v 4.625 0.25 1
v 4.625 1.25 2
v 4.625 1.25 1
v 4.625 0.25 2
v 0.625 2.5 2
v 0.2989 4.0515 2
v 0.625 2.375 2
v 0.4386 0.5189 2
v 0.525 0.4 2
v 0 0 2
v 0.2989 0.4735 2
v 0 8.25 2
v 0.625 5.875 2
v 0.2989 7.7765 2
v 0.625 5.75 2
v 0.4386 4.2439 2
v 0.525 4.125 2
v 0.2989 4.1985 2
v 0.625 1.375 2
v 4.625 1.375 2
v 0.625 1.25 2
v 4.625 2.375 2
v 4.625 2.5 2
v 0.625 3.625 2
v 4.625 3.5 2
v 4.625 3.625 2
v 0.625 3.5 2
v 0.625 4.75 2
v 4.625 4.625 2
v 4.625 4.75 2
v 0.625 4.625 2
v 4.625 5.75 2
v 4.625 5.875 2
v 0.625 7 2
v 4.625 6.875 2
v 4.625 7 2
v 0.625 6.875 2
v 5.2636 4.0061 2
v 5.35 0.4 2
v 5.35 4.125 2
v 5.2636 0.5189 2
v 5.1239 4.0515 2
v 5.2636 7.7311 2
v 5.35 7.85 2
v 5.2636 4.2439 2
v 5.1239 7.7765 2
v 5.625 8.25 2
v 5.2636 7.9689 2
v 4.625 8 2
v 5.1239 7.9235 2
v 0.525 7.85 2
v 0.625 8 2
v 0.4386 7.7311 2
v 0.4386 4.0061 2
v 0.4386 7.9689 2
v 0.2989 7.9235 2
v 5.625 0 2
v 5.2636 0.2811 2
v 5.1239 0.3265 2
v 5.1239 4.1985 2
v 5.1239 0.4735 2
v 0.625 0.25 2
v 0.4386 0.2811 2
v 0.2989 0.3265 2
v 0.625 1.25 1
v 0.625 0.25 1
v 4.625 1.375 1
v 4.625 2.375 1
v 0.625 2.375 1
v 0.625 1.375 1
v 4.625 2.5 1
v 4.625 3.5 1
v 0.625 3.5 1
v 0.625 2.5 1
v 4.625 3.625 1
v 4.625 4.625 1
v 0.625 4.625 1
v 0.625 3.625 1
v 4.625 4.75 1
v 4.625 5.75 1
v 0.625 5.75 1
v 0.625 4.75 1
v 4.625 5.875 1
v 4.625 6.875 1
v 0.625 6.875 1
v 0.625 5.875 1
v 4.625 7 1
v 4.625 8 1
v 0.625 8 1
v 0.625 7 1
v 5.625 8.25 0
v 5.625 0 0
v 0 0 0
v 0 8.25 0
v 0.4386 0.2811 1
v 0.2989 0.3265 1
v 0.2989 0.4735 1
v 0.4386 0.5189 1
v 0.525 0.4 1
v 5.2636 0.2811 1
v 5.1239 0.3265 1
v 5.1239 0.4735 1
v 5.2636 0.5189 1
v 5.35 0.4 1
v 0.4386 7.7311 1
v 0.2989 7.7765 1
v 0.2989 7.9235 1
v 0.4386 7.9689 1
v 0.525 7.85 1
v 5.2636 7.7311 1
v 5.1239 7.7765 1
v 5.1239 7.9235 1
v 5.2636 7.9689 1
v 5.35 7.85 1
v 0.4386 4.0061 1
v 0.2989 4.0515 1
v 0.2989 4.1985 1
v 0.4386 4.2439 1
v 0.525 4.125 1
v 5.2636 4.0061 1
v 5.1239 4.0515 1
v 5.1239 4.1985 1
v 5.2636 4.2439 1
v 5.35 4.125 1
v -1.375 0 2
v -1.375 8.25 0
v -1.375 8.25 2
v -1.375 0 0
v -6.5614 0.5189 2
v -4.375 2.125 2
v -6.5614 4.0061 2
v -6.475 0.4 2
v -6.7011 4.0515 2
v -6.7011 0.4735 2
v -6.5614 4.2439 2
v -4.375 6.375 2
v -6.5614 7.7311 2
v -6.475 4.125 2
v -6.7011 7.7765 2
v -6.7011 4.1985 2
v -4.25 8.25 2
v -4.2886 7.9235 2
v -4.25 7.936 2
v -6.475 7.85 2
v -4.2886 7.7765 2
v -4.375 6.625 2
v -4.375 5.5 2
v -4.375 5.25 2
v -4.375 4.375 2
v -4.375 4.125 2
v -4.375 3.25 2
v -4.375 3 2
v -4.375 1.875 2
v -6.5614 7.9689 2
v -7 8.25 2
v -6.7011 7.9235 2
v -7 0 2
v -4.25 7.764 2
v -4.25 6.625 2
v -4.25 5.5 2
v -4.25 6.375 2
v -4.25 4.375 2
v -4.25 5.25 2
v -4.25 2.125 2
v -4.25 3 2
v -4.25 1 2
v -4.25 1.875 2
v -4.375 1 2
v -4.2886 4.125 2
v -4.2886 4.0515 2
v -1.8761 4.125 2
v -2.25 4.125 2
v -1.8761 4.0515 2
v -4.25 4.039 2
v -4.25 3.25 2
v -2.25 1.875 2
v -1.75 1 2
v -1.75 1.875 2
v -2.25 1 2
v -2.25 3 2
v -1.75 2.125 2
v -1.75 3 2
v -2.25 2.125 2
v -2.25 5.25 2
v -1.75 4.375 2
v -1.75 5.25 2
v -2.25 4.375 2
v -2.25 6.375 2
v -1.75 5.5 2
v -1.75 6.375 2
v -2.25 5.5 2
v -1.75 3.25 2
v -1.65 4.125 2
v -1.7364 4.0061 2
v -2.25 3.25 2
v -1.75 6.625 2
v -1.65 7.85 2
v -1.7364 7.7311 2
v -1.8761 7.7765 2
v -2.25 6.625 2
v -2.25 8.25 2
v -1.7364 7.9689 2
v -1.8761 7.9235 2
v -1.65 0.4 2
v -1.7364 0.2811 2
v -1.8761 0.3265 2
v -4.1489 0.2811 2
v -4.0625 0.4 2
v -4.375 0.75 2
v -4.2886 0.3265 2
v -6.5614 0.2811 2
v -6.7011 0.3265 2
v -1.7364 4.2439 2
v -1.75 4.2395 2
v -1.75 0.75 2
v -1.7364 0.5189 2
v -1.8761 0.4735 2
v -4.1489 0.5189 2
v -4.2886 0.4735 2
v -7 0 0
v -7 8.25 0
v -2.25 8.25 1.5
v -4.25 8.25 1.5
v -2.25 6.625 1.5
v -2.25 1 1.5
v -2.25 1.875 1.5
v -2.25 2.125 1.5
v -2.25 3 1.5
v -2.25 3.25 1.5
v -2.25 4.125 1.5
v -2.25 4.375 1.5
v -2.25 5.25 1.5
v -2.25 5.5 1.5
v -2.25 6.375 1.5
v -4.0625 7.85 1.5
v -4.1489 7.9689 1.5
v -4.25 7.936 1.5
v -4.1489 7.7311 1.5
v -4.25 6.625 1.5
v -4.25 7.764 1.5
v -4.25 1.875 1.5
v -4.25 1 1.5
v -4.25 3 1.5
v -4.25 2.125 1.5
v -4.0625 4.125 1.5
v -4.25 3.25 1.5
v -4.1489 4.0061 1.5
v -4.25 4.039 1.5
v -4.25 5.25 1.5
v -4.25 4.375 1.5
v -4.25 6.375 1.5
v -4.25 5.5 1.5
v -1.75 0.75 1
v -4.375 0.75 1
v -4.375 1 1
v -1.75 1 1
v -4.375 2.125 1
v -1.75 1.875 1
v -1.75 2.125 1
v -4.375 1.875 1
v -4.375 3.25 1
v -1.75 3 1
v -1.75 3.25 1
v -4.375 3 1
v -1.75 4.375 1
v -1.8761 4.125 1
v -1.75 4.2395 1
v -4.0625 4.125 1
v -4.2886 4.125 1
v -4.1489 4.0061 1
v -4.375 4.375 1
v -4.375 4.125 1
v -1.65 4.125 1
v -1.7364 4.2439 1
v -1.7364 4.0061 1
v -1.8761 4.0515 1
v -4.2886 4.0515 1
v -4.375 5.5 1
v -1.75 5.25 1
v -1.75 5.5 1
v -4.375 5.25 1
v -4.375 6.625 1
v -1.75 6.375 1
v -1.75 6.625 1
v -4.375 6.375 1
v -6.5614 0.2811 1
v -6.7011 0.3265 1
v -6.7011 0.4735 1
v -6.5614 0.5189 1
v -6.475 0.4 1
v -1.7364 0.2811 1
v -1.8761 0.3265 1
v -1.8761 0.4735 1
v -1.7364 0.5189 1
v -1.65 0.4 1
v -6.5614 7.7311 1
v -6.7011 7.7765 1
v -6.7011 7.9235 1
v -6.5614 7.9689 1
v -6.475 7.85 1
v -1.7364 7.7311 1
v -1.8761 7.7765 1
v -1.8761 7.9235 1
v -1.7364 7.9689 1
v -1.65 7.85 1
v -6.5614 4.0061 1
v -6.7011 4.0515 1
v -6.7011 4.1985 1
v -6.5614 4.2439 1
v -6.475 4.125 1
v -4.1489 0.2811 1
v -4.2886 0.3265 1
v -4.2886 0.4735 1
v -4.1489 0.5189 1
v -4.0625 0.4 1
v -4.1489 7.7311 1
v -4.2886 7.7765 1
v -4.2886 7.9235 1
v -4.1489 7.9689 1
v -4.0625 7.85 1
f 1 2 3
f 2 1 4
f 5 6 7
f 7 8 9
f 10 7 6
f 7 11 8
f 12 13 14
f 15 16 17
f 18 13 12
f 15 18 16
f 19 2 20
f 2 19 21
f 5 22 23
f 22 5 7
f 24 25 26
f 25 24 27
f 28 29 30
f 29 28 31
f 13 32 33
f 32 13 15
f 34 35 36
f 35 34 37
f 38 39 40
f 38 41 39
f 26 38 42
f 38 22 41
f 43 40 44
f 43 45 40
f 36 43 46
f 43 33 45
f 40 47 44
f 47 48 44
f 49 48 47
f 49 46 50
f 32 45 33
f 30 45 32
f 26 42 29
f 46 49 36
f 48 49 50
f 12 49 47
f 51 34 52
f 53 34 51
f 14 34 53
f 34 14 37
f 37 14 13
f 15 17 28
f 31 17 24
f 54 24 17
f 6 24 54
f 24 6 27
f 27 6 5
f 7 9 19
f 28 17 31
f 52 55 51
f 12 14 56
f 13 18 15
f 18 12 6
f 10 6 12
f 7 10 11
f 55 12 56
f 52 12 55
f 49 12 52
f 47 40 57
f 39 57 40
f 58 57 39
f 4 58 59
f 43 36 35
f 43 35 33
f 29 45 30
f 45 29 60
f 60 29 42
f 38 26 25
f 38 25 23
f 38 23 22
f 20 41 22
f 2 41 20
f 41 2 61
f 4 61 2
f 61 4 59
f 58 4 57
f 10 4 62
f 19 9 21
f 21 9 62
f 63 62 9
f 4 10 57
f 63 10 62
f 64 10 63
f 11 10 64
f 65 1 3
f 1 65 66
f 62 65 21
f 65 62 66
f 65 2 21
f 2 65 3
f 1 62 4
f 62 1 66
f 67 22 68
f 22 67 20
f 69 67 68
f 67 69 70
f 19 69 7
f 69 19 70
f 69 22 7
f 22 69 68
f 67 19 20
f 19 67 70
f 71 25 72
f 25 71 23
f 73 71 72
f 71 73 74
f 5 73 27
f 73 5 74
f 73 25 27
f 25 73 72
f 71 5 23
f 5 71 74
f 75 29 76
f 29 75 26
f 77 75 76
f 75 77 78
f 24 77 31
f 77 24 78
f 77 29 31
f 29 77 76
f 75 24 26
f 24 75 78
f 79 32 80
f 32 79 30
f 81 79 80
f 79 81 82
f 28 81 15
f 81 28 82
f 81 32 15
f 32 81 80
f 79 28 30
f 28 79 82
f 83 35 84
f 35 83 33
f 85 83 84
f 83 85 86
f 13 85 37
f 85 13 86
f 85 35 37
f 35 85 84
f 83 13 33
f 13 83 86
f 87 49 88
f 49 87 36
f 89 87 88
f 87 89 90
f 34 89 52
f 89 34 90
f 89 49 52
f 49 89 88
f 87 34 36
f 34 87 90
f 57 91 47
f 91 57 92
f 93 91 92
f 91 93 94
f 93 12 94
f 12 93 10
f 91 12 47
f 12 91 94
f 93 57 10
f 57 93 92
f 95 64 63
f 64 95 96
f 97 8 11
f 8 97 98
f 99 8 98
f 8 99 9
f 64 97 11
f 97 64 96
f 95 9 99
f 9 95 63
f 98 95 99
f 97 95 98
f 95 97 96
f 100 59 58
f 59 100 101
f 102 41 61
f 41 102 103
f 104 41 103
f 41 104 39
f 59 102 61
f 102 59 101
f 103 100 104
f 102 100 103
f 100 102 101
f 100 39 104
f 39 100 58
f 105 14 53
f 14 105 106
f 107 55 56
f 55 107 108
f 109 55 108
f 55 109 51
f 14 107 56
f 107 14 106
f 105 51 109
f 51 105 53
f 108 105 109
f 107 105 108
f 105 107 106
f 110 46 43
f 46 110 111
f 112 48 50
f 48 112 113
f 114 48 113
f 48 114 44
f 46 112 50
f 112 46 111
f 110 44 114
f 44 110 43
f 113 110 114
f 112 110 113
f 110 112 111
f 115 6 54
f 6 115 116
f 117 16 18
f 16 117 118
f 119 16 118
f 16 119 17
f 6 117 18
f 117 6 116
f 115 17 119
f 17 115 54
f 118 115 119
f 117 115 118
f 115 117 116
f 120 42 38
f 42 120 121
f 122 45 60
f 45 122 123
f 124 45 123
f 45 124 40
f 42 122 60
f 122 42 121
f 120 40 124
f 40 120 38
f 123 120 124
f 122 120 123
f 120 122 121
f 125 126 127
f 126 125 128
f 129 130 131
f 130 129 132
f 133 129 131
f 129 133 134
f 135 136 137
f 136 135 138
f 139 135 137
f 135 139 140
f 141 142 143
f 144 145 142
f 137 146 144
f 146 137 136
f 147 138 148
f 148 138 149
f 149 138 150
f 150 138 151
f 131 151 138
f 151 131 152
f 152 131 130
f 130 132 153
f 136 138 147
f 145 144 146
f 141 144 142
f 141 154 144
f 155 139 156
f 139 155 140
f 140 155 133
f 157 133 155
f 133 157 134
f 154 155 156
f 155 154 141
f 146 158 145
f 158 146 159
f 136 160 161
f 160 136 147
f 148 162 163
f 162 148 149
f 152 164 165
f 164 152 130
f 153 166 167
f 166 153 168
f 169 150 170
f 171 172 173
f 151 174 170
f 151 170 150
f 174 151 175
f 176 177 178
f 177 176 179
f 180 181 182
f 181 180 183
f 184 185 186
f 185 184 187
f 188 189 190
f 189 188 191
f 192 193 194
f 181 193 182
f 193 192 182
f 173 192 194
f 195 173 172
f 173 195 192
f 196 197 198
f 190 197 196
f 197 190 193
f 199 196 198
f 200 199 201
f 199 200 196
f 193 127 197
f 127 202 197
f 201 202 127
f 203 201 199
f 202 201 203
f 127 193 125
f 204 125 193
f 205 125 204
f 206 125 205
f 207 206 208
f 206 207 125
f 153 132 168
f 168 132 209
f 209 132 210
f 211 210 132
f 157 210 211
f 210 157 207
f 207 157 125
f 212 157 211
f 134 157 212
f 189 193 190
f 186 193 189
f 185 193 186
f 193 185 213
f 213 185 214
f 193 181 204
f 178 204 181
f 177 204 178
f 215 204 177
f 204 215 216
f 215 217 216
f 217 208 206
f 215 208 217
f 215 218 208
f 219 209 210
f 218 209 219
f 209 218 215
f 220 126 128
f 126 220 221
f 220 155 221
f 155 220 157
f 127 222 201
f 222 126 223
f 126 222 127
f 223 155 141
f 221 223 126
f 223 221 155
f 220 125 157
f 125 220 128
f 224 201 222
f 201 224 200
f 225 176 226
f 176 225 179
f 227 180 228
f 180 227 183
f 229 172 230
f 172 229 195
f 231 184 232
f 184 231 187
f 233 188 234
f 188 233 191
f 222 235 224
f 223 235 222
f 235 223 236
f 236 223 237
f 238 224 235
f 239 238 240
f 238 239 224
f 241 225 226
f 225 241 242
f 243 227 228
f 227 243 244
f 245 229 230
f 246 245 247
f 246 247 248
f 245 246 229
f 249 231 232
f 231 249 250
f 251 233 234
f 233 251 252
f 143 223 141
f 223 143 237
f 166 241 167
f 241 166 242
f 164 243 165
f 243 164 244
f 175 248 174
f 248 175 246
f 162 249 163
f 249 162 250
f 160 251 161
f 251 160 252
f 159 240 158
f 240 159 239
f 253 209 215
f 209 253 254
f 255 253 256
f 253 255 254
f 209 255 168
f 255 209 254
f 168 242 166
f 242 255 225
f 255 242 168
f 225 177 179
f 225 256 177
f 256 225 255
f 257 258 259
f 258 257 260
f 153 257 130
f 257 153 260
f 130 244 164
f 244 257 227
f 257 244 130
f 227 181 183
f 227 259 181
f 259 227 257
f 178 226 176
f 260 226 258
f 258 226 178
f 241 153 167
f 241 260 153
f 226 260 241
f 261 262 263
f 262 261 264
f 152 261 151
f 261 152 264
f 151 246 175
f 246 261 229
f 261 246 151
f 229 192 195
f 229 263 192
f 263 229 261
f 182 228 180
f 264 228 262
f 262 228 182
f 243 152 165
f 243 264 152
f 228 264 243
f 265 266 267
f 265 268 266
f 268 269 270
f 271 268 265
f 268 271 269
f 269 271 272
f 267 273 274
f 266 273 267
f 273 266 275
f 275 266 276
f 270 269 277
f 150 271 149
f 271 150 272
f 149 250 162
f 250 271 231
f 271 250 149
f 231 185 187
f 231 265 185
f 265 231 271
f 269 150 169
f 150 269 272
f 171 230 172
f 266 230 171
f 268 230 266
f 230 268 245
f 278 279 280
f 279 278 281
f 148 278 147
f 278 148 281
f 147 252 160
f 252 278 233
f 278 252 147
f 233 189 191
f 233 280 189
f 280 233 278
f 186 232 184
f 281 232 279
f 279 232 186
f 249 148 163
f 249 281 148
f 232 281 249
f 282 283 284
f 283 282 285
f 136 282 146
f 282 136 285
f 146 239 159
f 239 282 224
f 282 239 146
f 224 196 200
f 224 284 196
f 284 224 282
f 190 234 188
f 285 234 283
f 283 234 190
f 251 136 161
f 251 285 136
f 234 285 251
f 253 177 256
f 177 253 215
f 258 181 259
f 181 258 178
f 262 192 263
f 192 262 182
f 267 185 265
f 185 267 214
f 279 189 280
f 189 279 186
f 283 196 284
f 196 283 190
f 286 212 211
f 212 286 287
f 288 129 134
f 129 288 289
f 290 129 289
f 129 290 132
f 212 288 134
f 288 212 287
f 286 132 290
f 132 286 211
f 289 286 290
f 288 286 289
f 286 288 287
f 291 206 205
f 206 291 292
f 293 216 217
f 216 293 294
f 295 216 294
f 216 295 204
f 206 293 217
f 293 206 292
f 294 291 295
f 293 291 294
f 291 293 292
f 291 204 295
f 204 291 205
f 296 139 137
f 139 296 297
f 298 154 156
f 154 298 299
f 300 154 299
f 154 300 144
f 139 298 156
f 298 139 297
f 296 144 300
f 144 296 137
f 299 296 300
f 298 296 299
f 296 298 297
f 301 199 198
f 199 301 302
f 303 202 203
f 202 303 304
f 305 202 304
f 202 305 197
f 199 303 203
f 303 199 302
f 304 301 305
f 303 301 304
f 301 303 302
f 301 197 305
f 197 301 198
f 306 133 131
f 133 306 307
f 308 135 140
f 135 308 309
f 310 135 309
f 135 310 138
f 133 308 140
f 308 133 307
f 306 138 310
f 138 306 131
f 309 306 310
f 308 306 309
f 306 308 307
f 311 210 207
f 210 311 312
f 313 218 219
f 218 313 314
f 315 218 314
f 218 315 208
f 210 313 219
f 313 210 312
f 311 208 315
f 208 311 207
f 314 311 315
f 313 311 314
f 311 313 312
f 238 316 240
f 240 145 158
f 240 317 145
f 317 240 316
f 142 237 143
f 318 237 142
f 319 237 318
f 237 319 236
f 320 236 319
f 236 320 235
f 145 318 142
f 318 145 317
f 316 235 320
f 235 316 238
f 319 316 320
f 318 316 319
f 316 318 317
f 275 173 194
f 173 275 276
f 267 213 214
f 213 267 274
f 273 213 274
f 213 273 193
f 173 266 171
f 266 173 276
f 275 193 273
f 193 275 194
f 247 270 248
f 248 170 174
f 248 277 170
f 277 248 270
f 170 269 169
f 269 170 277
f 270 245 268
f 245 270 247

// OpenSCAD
Top();
translate([-7,0,0]) Bottom();

Width=5+5/8;
Length=8.25;
Height=2;

//Number of Drives
DriveNumX=7;
DriveNumY=1;

//drive offset
DriveOffsetX1=5/8;
DriveOffsetX2=1.25;
DriveOffsetY=0;
DriveOffsetZ=1;

//drive spacing
DriveSpace=0.125;
DriveInset=1;
DriveBaseOffset=0.25;

//drive demintions
DriveLength=5.75;
DriveWidth=4;
DriveHeight=1;

//supports
SupportOffset=0.4;
SupportRadius=.125;

//bottom cutouts
cablegrooveX=0;
connectorCutX=2;
connectorCutY=0.25;
connectorCutZ=1;
connectorOffX1=DriveOffsetX1+DriveWidth-connectorCutX;
connectorOffX2=DriveOffsetX2+DriveWidth-connectorCutX;

module Top()
{
difference()
	{
	cube([Width,Length,Height]);

for (J = [0 : DriveNumY-1])
{
	for (Z = [0 : DriveNumX-1])
	{
		translate([DriveOffsetX1+DriveOffsetX2*J,DriveBaseOffset+DriveSpace*Z+DriveHeight*Z,DriveOffsetZ]) cube([DriveWidth,DriveHeight,DriveInset]);
	}
}

	translate([SupportOffset,SupportOffset,1]) cylinder (h=1,r=SupportRadius);
	translate([Width-SupportOffset,SupportOffset,1]) cylinder (h=1,r=SupportRadius);
	translate([SupportOffset,Length-SupportOffset,1]) cylinder (h=1,r=SupportRadius);
	translate([Width-SupportOffset,Length-SupportOffset,1]) cylinder (h=1,r=SupportRadius);

	translate([SupportOffset,Length/2,1]) cylinder (h=1,r=SupportRadius);
	translate([Width/2,SupportOffset,1]) cylinder (h=1,r=SupportRadius);
	translate([Width/2,Length-SupportOffset,1]) cylinder (h=1,r=SupportRadius);
	translate([Width-SupportOffset,Length/2,1]) cylinder (h=1,r=SupportRadius);

	translate([Width/2,Length/2,1]) cylinder (h=1,r=SupportRadius);
	}
}

module Bottom()
{
difference()
	{
	cube([Width,Length,Height]);
	translate([2.75,.75,1.5]) cube([connectorCutX,11.25,0.5]);
	translate([7.25,.75,1.5]) cube([connectorCutX,11.25,0.5]);

	translate([connectorOffX1,0.75+DriveSpace*0+DriveHeight*0,DriveOffsetZ]) cube([connectorCutX,connectorCutY,connectorCutZ]);
	translate([connectorOffX1,0.75+DriveSpace*1+DriveHeight*1,DriveOffsetZ]) cube([connectorCutX,connectorCutY,connectorCutZ]);
	translate([connectorOffX1,0.75+DriveSpace*2+DriveHeight*2,DriveOffsetZ]) cube([connectorCutX,connectorCutY,connectorCutZ]);
	translate([connectorOffX1,0.75+DriveSpace*3+DriveHeight*3,DriveOffsetZ]) cube([connectorCutX,connectorCutY,connectorCutZ]);
	translate([connectorOffX1,0.75+DriveSpace*4+DriveHeight*4,DriveOffsetZ]) cube([connectorCutX,connectorCutY,connectorCutZ]);
	translate([connectorOffX1,0.75+DriveSpace*5+DriveHeight*5,DriveOffsetZ]) cube([connectorCutX,connectorCutY,connectorCutZ]);

	translate([connectorOffX2,0.75+DriveSpace*0+DriveHeight*0,DriveOffsetZ]) cube([connectorCutX,connectorCutY,connectorCutZ]);
	translate([connectorOffX2,0.75+DriveSpace*1+DriveHeight*1,DriveOffsetZ]) cube([connectorCutX,connectorCutY,connectorCutZ]);
	translate([connectorOffX2,0.75+DriveSpace*2+DriveHeight*2,DriveOffsetZ]) cube([connectorCutX,connectorCutY,connectorCutZ]);
	translate([connectorOffX2,0.75+DriveSpace*3+DriveHeight*3,DriveOffsetZ]) cube([connectorCutX,connectorCutY,connectorCutZ]);
	translate([connectorOffX2,0.75+DriveSpace*4+DriveHeight*4,DriveOffsetZ]) cube([connectorCutX,connectorCutY,connectorCutZ]);
	translate([connectorOffX2,0.75+DriveSpace*5+DriveHeight*5,DriveOffsetZ]) cube([connectorCutX,connectorCutY,connectorCutZ]);

	translate([SupportOffset,SupportOffset,1]) cylinder (h=1,r=SupportRadius);
	translate([Width-SupportOffset,SupportOffset,1]) cylinder (h=1,r=SupportRadius);
	translate([SupportOffset,Length-SupportOffset,1]) cylinder (h=1,r=SupportRadius);
	translate([Width-SupportOffset,Length-SupportOffset,1]) cylinder (h=1,r=SupportRadius);

	translate([SupportOffset,Length/2,1]) cylinder (h=1,r=SupportRadius);
	translate([Width/2,SupportOffset,1]) cylinder (h=1,r=SupportRadius);
	translate([Width/2,Length-SupportOffset,1]) cylinder (h=1,r=SupportRadius);
	translate([Width-SupportOffset,Length/2,1]) cylinder (h=1,r=SupportRadius);

	translate([Width/2,Length/2,1]) cylinder (h=1,r=SupportRadius);
	}
}
